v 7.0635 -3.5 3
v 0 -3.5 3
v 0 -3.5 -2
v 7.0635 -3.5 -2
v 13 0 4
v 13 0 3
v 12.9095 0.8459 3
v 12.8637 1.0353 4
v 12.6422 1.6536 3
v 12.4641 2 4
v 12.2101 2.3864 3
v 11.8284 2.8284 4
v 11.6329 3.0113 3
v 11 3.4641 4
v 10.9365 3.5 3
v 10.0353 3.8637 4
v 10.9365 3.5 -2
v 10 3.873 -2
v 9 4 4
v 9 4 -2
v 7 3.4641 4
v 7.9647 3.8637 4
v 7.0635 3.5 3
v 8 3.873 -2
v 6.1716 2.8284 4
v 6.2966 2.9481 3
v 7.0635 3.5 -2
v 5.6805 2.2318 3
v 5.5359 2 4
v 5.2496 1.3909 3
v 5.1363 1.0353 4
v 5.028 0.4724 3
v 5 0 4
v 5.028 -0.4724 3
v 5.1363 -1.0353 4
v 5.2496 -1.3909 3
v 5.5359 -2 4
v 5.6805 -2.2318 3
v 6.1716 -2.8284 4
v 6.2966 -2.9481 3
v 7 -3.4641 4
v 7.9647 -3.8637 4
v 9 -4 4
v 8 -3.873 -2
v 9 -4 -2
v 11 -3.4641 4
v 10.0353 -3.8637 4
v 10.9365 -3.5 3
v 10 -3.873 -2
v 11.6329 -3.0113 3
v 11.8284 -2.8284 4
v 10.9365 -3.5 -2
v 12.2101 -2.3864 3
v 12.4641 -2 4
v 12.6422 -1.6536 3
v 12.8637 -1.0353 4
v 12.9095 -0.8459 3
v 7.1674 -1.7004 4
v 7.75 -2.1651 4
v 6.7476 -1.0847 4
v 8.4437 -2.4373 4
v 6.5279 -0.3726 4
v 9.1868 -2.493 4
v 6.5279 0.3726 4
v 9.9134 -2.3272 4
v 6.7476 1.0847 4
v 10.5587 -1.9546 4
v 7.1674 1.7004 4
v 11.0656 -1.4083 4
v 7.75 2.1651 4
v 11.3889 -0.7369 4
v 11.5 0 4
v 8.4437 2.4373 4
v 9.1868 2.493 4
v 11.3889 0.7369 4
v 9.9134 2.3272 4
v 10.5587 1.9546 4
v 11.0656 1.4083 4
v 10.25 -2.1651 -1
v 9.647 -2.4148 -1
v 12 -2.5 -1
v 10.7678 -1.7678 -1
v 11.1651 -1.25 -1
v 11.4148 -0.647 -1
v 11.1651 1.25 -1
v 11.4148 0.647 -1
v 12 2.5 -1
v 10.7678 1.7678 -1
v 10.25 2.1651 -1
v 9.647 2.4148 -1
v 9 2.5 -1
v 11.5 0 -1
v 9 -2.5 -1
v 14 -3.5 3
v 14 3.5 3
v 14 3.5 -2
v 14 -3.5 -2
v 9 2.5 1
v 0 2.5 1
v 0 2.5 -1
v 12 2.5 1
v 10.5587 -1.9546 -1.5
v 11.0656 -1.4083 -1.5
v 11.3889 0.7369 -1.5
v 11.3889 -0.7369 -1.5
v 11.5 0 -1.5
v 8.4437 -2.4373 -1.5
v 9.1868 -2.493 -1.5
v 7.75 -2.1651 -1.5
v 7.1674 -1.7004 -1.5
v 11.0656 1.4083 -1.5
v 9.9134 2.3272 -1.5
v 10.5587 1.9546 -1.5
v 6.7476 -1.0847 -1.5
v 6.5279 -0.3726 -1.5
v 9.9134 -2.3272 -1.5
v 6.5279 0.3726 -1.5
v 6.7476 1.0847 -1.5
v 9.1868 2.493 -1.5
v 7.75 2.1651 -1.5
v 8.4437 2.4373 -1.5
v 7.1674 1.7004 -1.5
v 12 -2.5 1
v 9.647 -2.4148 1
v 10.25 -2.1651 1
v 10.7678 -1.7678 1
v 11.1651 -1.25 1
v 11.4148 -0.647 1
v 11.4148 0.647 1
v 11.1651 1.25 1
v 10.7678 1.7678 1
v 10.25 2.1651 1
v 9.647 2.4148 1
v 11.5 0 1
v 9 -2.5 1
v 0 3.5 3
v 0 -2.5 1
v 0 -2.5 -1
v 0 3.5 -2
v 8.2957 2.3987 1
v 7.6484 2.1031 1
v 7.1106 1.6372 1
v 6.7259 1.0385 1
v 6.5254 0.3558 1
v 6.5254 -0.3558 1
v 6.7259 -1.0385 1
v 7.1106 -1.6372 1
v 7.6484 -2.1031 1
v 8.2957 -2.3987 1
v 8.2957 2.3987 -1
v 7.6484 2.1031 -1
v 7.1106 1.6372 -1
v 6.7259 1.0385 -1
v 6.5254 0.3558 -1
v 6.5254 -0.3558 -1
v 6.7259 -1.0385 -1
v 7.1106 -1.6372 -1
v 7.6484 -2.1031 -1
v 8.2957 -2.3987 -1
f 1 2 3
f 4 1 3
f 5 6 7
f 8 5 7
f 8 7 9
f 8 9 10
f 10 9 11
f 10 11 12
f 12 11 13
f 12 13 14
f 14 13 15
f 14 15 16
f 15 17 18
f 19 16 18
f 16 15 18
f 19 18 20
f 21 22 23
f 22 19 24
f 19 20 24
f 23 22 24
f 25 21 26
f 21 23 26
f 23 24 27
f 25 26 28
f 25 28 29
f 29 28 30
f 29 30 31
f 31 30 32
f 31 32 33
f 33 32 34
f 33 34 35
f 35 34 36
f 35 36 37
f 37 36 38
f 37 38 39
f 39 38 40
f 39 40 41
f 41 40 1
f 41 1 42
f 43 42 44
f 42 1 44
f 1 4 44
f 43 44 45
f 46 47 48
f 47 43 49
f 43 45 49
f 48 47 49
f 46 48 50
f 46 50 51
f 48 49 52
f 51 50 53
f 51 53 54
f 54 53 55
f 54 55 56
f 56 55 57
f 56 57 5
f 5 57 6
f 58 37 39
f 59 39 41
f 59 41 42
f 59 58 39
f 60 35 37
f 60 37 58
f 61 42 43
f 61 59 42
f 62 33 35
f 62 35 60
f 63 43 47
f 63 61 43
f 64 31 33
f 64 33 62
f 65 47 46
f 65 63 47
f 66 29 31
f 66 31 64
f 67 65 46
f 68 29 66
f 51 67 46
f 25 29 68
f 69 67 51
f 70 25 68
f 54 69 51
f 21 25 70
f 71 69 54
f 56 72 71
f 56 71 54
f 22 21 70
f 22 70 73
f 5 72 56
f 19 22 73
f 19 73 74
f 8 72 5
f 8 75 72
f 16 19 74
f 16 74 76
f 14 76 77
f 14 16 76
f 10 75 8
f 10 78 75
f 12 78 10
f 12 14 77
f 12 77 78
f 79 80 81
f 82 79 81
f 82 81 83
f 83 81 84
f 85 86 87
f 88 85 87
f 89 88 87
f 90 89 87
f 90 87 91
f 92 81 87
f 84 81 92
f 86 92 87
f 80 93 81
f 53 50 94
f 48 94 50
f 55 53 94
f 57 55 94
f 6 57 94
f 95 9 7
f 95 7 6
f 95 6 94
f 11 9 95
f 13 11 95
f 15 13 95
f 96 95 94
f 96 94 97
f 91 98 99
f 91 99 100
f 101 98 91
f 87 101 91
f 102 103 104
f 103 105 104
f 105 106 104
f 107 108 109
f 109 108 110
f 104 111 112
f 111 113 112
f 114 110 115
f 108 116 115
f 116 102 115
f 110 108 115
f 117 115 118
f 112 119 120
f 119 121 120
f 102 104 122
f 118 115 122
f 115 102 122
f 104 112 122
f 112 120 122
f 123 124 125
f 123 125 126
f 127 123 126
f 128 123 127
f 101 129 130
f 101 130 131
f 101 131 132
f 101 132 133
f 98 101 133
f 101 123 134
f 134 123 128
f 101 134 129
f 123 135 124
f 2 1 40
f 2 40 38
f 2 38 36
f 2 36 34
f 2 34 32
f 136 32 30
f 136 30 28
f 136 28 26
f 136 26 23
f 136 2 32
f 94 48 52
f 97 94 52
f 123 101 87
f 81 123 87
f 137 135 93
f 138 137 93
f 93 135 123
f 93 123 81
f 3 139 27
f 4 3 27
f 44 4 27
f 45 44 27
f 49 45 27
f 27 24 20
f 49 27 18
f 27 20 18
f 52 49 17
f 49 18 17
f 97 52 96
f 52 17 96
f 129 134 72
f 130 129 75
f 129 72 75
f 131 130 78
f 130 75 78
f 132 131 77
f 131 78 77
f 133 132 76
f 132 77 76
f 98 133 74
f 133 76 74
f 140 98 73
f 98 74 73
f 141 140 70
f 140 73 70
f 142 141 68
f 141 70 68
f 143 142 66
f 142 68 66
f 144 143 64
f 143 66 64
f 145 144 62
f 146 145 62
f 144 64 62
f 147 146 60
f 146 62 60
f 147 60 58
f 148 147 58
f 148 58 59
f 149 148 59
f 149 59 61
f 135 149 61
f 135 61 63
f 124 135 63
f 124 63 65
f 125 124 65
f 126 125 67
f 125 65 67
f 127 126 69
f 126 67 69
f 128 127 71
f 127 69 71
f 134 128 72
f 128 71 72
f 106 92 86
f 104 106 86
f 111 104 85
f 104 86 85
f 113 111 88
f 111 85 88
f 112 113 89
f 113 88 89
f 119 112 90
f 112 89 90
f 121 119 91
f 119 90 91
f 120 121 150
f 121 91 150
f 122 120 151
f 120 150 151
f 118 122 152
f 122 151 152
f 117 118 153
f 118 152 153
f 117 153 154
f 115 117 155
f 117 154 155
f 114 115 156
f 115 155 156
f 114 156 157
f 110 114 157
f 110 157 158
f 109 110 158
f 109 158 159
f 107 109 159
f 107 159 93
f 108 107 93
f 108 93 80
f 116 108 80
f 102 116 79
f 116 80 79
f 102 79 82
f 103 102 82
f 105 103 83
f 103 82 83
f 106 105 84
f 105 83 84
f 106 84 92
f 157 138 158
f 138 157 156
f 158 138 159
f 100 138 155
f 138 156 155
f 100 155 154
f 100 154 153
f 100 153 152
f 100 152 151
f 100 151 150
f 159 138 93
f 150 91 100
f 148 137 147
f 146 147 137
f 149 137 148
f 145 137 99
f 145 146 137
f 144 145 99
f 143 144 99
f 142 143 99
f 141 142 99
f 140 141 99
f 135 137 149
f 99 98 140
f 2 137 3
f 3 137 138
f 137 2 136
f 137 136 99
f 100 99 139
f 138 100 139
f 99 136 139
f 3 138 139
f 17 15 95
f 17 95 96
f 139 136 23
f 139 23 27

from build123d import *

# Parameters (mm, degrees)
SKETCH1_W                = 4
SKETCH1_H                = 7
SKETCH1_W_2              = 2
SKETCH1_H_2              = 5
SKETCH1_W_3              = 1
BOSS_EXTRUDE1_DEPTH      = 14
SKETCH2_R                = 2.5
CUT_EXTRUDE1_DEPTH       = 14
BOSS_EXTRUDE3_DEPTH      = 1
BOSS_EXTRUDE3_DEPTH_BACK = 5
SKETCH3_R                = 4
SKETCH3_R_2              = 2.5
SKETCH4_W                = 2
SKETCH4_H                = 5
CUT_EXTRUDE2_DEPTH       = 16.099668871
SKETCH6_W                = 5.975626827
SKETCH6_H                = 5.438491831
BOSS_EXTRUDE4_DEPTH      = 0.5
SKETCH7_W                = 2
SKETCH7_H                = 5
BOSS_EXTRUDE5_DEPTH      = 2


with BuildPart() as part:
    # Sketch1 → Boss-Extrude1 (new body)
    # profile 1 of 2: a face of its own
    with BuildSketch(Plane(origin=(0, 0, 0), x_dir=(0, 0, -1), z_dir=(1, 0, 0))):
        Rectangle(SKETCH1_W, SKETCH1_H)
        Rectangle(SKETCH1_W_2, SKETCH1_H_2, mode=Mode.SUBTRACT)
    # profile 2 of 2: a face of its own
    with BuildSketch(Plane(origin=(0, 0, 0), x_dir=(0, 0, -1), z_dir=(1, 0, 0))):
        with Locations((-2.5, 0)):
            Rectangle(SKETCH1_W_3, SKETCH1_H)
    extrude(amount=BOSS_EXTRUDE1_DEPTH)

    # Sketch2 → Cut-Extrude1 (cut)
    with BuildSketch(Plane.XY.offset(3)):
        with Locations((9, 0)):
            Circle(SKETCH2_R)
    extrude(amount=-CUT_EXTRUDE1_DEPTH, mode=Mode.SUBTRACT)

    # Sketch3 → Boss-Extrude3 (add, two sides: drawn at the far end of the back side and taken through both)
    with BuildSketch(Plane.XY.offset(3).offset(-BOSS_EXTRUDE3_DEPTH_BACK)):
        with Locations((9, 0)):
            Circle(SKETCH3_R)
        with Locations((9, 0)):
            Circle(SKETCH3_R_2, mode=Mode.SUBTRACT)
    extrude(amount=BOSS_EXTRUDE3_DEPTH + BOSS_EXTRUDE3_DEPTH_BACK)

    # Sketch4 → Cut-Extrude2 (cut, through all)
    with BuildSketch(Plane(origin=(14, 0, 0), x_dir=(0, 0, -1), z_dir=(1, 0, 0))):
        Rectangle(SKETCH4_W, SKETCH4_H)
    extrude(amount=-CUT_EXTRUDE2_DEPTH, mode=Mode.SUBTRACT)

    # Sketch6 → Boss-Extrude4 (add)
    with BuildSketch(Plane(origin=(0, 0, -2), x_dir=(-1, 0, 0), z_dir=(0, 0, -1))):
        with Locations((-9.038624366, 0.008392735)):
            Rectangle(SKETCH6_W, SKETCH6_H)
    extrude(amount=-BOSS_EXTRUDE4_DEPTH)

    # Sketch7 → Boss-Extrude5 (add)
    with BuildSketch(Plane(origin=(14, 0, 0), x_dir=(0, 0, -1), z_dir=(1, 0, 0))):
        Rectangle(SKETCH7_W, SKETCH7_H)
    extrude(amount=-BOSS_EXTRUDE5_DEPTH)


solid = part.part
